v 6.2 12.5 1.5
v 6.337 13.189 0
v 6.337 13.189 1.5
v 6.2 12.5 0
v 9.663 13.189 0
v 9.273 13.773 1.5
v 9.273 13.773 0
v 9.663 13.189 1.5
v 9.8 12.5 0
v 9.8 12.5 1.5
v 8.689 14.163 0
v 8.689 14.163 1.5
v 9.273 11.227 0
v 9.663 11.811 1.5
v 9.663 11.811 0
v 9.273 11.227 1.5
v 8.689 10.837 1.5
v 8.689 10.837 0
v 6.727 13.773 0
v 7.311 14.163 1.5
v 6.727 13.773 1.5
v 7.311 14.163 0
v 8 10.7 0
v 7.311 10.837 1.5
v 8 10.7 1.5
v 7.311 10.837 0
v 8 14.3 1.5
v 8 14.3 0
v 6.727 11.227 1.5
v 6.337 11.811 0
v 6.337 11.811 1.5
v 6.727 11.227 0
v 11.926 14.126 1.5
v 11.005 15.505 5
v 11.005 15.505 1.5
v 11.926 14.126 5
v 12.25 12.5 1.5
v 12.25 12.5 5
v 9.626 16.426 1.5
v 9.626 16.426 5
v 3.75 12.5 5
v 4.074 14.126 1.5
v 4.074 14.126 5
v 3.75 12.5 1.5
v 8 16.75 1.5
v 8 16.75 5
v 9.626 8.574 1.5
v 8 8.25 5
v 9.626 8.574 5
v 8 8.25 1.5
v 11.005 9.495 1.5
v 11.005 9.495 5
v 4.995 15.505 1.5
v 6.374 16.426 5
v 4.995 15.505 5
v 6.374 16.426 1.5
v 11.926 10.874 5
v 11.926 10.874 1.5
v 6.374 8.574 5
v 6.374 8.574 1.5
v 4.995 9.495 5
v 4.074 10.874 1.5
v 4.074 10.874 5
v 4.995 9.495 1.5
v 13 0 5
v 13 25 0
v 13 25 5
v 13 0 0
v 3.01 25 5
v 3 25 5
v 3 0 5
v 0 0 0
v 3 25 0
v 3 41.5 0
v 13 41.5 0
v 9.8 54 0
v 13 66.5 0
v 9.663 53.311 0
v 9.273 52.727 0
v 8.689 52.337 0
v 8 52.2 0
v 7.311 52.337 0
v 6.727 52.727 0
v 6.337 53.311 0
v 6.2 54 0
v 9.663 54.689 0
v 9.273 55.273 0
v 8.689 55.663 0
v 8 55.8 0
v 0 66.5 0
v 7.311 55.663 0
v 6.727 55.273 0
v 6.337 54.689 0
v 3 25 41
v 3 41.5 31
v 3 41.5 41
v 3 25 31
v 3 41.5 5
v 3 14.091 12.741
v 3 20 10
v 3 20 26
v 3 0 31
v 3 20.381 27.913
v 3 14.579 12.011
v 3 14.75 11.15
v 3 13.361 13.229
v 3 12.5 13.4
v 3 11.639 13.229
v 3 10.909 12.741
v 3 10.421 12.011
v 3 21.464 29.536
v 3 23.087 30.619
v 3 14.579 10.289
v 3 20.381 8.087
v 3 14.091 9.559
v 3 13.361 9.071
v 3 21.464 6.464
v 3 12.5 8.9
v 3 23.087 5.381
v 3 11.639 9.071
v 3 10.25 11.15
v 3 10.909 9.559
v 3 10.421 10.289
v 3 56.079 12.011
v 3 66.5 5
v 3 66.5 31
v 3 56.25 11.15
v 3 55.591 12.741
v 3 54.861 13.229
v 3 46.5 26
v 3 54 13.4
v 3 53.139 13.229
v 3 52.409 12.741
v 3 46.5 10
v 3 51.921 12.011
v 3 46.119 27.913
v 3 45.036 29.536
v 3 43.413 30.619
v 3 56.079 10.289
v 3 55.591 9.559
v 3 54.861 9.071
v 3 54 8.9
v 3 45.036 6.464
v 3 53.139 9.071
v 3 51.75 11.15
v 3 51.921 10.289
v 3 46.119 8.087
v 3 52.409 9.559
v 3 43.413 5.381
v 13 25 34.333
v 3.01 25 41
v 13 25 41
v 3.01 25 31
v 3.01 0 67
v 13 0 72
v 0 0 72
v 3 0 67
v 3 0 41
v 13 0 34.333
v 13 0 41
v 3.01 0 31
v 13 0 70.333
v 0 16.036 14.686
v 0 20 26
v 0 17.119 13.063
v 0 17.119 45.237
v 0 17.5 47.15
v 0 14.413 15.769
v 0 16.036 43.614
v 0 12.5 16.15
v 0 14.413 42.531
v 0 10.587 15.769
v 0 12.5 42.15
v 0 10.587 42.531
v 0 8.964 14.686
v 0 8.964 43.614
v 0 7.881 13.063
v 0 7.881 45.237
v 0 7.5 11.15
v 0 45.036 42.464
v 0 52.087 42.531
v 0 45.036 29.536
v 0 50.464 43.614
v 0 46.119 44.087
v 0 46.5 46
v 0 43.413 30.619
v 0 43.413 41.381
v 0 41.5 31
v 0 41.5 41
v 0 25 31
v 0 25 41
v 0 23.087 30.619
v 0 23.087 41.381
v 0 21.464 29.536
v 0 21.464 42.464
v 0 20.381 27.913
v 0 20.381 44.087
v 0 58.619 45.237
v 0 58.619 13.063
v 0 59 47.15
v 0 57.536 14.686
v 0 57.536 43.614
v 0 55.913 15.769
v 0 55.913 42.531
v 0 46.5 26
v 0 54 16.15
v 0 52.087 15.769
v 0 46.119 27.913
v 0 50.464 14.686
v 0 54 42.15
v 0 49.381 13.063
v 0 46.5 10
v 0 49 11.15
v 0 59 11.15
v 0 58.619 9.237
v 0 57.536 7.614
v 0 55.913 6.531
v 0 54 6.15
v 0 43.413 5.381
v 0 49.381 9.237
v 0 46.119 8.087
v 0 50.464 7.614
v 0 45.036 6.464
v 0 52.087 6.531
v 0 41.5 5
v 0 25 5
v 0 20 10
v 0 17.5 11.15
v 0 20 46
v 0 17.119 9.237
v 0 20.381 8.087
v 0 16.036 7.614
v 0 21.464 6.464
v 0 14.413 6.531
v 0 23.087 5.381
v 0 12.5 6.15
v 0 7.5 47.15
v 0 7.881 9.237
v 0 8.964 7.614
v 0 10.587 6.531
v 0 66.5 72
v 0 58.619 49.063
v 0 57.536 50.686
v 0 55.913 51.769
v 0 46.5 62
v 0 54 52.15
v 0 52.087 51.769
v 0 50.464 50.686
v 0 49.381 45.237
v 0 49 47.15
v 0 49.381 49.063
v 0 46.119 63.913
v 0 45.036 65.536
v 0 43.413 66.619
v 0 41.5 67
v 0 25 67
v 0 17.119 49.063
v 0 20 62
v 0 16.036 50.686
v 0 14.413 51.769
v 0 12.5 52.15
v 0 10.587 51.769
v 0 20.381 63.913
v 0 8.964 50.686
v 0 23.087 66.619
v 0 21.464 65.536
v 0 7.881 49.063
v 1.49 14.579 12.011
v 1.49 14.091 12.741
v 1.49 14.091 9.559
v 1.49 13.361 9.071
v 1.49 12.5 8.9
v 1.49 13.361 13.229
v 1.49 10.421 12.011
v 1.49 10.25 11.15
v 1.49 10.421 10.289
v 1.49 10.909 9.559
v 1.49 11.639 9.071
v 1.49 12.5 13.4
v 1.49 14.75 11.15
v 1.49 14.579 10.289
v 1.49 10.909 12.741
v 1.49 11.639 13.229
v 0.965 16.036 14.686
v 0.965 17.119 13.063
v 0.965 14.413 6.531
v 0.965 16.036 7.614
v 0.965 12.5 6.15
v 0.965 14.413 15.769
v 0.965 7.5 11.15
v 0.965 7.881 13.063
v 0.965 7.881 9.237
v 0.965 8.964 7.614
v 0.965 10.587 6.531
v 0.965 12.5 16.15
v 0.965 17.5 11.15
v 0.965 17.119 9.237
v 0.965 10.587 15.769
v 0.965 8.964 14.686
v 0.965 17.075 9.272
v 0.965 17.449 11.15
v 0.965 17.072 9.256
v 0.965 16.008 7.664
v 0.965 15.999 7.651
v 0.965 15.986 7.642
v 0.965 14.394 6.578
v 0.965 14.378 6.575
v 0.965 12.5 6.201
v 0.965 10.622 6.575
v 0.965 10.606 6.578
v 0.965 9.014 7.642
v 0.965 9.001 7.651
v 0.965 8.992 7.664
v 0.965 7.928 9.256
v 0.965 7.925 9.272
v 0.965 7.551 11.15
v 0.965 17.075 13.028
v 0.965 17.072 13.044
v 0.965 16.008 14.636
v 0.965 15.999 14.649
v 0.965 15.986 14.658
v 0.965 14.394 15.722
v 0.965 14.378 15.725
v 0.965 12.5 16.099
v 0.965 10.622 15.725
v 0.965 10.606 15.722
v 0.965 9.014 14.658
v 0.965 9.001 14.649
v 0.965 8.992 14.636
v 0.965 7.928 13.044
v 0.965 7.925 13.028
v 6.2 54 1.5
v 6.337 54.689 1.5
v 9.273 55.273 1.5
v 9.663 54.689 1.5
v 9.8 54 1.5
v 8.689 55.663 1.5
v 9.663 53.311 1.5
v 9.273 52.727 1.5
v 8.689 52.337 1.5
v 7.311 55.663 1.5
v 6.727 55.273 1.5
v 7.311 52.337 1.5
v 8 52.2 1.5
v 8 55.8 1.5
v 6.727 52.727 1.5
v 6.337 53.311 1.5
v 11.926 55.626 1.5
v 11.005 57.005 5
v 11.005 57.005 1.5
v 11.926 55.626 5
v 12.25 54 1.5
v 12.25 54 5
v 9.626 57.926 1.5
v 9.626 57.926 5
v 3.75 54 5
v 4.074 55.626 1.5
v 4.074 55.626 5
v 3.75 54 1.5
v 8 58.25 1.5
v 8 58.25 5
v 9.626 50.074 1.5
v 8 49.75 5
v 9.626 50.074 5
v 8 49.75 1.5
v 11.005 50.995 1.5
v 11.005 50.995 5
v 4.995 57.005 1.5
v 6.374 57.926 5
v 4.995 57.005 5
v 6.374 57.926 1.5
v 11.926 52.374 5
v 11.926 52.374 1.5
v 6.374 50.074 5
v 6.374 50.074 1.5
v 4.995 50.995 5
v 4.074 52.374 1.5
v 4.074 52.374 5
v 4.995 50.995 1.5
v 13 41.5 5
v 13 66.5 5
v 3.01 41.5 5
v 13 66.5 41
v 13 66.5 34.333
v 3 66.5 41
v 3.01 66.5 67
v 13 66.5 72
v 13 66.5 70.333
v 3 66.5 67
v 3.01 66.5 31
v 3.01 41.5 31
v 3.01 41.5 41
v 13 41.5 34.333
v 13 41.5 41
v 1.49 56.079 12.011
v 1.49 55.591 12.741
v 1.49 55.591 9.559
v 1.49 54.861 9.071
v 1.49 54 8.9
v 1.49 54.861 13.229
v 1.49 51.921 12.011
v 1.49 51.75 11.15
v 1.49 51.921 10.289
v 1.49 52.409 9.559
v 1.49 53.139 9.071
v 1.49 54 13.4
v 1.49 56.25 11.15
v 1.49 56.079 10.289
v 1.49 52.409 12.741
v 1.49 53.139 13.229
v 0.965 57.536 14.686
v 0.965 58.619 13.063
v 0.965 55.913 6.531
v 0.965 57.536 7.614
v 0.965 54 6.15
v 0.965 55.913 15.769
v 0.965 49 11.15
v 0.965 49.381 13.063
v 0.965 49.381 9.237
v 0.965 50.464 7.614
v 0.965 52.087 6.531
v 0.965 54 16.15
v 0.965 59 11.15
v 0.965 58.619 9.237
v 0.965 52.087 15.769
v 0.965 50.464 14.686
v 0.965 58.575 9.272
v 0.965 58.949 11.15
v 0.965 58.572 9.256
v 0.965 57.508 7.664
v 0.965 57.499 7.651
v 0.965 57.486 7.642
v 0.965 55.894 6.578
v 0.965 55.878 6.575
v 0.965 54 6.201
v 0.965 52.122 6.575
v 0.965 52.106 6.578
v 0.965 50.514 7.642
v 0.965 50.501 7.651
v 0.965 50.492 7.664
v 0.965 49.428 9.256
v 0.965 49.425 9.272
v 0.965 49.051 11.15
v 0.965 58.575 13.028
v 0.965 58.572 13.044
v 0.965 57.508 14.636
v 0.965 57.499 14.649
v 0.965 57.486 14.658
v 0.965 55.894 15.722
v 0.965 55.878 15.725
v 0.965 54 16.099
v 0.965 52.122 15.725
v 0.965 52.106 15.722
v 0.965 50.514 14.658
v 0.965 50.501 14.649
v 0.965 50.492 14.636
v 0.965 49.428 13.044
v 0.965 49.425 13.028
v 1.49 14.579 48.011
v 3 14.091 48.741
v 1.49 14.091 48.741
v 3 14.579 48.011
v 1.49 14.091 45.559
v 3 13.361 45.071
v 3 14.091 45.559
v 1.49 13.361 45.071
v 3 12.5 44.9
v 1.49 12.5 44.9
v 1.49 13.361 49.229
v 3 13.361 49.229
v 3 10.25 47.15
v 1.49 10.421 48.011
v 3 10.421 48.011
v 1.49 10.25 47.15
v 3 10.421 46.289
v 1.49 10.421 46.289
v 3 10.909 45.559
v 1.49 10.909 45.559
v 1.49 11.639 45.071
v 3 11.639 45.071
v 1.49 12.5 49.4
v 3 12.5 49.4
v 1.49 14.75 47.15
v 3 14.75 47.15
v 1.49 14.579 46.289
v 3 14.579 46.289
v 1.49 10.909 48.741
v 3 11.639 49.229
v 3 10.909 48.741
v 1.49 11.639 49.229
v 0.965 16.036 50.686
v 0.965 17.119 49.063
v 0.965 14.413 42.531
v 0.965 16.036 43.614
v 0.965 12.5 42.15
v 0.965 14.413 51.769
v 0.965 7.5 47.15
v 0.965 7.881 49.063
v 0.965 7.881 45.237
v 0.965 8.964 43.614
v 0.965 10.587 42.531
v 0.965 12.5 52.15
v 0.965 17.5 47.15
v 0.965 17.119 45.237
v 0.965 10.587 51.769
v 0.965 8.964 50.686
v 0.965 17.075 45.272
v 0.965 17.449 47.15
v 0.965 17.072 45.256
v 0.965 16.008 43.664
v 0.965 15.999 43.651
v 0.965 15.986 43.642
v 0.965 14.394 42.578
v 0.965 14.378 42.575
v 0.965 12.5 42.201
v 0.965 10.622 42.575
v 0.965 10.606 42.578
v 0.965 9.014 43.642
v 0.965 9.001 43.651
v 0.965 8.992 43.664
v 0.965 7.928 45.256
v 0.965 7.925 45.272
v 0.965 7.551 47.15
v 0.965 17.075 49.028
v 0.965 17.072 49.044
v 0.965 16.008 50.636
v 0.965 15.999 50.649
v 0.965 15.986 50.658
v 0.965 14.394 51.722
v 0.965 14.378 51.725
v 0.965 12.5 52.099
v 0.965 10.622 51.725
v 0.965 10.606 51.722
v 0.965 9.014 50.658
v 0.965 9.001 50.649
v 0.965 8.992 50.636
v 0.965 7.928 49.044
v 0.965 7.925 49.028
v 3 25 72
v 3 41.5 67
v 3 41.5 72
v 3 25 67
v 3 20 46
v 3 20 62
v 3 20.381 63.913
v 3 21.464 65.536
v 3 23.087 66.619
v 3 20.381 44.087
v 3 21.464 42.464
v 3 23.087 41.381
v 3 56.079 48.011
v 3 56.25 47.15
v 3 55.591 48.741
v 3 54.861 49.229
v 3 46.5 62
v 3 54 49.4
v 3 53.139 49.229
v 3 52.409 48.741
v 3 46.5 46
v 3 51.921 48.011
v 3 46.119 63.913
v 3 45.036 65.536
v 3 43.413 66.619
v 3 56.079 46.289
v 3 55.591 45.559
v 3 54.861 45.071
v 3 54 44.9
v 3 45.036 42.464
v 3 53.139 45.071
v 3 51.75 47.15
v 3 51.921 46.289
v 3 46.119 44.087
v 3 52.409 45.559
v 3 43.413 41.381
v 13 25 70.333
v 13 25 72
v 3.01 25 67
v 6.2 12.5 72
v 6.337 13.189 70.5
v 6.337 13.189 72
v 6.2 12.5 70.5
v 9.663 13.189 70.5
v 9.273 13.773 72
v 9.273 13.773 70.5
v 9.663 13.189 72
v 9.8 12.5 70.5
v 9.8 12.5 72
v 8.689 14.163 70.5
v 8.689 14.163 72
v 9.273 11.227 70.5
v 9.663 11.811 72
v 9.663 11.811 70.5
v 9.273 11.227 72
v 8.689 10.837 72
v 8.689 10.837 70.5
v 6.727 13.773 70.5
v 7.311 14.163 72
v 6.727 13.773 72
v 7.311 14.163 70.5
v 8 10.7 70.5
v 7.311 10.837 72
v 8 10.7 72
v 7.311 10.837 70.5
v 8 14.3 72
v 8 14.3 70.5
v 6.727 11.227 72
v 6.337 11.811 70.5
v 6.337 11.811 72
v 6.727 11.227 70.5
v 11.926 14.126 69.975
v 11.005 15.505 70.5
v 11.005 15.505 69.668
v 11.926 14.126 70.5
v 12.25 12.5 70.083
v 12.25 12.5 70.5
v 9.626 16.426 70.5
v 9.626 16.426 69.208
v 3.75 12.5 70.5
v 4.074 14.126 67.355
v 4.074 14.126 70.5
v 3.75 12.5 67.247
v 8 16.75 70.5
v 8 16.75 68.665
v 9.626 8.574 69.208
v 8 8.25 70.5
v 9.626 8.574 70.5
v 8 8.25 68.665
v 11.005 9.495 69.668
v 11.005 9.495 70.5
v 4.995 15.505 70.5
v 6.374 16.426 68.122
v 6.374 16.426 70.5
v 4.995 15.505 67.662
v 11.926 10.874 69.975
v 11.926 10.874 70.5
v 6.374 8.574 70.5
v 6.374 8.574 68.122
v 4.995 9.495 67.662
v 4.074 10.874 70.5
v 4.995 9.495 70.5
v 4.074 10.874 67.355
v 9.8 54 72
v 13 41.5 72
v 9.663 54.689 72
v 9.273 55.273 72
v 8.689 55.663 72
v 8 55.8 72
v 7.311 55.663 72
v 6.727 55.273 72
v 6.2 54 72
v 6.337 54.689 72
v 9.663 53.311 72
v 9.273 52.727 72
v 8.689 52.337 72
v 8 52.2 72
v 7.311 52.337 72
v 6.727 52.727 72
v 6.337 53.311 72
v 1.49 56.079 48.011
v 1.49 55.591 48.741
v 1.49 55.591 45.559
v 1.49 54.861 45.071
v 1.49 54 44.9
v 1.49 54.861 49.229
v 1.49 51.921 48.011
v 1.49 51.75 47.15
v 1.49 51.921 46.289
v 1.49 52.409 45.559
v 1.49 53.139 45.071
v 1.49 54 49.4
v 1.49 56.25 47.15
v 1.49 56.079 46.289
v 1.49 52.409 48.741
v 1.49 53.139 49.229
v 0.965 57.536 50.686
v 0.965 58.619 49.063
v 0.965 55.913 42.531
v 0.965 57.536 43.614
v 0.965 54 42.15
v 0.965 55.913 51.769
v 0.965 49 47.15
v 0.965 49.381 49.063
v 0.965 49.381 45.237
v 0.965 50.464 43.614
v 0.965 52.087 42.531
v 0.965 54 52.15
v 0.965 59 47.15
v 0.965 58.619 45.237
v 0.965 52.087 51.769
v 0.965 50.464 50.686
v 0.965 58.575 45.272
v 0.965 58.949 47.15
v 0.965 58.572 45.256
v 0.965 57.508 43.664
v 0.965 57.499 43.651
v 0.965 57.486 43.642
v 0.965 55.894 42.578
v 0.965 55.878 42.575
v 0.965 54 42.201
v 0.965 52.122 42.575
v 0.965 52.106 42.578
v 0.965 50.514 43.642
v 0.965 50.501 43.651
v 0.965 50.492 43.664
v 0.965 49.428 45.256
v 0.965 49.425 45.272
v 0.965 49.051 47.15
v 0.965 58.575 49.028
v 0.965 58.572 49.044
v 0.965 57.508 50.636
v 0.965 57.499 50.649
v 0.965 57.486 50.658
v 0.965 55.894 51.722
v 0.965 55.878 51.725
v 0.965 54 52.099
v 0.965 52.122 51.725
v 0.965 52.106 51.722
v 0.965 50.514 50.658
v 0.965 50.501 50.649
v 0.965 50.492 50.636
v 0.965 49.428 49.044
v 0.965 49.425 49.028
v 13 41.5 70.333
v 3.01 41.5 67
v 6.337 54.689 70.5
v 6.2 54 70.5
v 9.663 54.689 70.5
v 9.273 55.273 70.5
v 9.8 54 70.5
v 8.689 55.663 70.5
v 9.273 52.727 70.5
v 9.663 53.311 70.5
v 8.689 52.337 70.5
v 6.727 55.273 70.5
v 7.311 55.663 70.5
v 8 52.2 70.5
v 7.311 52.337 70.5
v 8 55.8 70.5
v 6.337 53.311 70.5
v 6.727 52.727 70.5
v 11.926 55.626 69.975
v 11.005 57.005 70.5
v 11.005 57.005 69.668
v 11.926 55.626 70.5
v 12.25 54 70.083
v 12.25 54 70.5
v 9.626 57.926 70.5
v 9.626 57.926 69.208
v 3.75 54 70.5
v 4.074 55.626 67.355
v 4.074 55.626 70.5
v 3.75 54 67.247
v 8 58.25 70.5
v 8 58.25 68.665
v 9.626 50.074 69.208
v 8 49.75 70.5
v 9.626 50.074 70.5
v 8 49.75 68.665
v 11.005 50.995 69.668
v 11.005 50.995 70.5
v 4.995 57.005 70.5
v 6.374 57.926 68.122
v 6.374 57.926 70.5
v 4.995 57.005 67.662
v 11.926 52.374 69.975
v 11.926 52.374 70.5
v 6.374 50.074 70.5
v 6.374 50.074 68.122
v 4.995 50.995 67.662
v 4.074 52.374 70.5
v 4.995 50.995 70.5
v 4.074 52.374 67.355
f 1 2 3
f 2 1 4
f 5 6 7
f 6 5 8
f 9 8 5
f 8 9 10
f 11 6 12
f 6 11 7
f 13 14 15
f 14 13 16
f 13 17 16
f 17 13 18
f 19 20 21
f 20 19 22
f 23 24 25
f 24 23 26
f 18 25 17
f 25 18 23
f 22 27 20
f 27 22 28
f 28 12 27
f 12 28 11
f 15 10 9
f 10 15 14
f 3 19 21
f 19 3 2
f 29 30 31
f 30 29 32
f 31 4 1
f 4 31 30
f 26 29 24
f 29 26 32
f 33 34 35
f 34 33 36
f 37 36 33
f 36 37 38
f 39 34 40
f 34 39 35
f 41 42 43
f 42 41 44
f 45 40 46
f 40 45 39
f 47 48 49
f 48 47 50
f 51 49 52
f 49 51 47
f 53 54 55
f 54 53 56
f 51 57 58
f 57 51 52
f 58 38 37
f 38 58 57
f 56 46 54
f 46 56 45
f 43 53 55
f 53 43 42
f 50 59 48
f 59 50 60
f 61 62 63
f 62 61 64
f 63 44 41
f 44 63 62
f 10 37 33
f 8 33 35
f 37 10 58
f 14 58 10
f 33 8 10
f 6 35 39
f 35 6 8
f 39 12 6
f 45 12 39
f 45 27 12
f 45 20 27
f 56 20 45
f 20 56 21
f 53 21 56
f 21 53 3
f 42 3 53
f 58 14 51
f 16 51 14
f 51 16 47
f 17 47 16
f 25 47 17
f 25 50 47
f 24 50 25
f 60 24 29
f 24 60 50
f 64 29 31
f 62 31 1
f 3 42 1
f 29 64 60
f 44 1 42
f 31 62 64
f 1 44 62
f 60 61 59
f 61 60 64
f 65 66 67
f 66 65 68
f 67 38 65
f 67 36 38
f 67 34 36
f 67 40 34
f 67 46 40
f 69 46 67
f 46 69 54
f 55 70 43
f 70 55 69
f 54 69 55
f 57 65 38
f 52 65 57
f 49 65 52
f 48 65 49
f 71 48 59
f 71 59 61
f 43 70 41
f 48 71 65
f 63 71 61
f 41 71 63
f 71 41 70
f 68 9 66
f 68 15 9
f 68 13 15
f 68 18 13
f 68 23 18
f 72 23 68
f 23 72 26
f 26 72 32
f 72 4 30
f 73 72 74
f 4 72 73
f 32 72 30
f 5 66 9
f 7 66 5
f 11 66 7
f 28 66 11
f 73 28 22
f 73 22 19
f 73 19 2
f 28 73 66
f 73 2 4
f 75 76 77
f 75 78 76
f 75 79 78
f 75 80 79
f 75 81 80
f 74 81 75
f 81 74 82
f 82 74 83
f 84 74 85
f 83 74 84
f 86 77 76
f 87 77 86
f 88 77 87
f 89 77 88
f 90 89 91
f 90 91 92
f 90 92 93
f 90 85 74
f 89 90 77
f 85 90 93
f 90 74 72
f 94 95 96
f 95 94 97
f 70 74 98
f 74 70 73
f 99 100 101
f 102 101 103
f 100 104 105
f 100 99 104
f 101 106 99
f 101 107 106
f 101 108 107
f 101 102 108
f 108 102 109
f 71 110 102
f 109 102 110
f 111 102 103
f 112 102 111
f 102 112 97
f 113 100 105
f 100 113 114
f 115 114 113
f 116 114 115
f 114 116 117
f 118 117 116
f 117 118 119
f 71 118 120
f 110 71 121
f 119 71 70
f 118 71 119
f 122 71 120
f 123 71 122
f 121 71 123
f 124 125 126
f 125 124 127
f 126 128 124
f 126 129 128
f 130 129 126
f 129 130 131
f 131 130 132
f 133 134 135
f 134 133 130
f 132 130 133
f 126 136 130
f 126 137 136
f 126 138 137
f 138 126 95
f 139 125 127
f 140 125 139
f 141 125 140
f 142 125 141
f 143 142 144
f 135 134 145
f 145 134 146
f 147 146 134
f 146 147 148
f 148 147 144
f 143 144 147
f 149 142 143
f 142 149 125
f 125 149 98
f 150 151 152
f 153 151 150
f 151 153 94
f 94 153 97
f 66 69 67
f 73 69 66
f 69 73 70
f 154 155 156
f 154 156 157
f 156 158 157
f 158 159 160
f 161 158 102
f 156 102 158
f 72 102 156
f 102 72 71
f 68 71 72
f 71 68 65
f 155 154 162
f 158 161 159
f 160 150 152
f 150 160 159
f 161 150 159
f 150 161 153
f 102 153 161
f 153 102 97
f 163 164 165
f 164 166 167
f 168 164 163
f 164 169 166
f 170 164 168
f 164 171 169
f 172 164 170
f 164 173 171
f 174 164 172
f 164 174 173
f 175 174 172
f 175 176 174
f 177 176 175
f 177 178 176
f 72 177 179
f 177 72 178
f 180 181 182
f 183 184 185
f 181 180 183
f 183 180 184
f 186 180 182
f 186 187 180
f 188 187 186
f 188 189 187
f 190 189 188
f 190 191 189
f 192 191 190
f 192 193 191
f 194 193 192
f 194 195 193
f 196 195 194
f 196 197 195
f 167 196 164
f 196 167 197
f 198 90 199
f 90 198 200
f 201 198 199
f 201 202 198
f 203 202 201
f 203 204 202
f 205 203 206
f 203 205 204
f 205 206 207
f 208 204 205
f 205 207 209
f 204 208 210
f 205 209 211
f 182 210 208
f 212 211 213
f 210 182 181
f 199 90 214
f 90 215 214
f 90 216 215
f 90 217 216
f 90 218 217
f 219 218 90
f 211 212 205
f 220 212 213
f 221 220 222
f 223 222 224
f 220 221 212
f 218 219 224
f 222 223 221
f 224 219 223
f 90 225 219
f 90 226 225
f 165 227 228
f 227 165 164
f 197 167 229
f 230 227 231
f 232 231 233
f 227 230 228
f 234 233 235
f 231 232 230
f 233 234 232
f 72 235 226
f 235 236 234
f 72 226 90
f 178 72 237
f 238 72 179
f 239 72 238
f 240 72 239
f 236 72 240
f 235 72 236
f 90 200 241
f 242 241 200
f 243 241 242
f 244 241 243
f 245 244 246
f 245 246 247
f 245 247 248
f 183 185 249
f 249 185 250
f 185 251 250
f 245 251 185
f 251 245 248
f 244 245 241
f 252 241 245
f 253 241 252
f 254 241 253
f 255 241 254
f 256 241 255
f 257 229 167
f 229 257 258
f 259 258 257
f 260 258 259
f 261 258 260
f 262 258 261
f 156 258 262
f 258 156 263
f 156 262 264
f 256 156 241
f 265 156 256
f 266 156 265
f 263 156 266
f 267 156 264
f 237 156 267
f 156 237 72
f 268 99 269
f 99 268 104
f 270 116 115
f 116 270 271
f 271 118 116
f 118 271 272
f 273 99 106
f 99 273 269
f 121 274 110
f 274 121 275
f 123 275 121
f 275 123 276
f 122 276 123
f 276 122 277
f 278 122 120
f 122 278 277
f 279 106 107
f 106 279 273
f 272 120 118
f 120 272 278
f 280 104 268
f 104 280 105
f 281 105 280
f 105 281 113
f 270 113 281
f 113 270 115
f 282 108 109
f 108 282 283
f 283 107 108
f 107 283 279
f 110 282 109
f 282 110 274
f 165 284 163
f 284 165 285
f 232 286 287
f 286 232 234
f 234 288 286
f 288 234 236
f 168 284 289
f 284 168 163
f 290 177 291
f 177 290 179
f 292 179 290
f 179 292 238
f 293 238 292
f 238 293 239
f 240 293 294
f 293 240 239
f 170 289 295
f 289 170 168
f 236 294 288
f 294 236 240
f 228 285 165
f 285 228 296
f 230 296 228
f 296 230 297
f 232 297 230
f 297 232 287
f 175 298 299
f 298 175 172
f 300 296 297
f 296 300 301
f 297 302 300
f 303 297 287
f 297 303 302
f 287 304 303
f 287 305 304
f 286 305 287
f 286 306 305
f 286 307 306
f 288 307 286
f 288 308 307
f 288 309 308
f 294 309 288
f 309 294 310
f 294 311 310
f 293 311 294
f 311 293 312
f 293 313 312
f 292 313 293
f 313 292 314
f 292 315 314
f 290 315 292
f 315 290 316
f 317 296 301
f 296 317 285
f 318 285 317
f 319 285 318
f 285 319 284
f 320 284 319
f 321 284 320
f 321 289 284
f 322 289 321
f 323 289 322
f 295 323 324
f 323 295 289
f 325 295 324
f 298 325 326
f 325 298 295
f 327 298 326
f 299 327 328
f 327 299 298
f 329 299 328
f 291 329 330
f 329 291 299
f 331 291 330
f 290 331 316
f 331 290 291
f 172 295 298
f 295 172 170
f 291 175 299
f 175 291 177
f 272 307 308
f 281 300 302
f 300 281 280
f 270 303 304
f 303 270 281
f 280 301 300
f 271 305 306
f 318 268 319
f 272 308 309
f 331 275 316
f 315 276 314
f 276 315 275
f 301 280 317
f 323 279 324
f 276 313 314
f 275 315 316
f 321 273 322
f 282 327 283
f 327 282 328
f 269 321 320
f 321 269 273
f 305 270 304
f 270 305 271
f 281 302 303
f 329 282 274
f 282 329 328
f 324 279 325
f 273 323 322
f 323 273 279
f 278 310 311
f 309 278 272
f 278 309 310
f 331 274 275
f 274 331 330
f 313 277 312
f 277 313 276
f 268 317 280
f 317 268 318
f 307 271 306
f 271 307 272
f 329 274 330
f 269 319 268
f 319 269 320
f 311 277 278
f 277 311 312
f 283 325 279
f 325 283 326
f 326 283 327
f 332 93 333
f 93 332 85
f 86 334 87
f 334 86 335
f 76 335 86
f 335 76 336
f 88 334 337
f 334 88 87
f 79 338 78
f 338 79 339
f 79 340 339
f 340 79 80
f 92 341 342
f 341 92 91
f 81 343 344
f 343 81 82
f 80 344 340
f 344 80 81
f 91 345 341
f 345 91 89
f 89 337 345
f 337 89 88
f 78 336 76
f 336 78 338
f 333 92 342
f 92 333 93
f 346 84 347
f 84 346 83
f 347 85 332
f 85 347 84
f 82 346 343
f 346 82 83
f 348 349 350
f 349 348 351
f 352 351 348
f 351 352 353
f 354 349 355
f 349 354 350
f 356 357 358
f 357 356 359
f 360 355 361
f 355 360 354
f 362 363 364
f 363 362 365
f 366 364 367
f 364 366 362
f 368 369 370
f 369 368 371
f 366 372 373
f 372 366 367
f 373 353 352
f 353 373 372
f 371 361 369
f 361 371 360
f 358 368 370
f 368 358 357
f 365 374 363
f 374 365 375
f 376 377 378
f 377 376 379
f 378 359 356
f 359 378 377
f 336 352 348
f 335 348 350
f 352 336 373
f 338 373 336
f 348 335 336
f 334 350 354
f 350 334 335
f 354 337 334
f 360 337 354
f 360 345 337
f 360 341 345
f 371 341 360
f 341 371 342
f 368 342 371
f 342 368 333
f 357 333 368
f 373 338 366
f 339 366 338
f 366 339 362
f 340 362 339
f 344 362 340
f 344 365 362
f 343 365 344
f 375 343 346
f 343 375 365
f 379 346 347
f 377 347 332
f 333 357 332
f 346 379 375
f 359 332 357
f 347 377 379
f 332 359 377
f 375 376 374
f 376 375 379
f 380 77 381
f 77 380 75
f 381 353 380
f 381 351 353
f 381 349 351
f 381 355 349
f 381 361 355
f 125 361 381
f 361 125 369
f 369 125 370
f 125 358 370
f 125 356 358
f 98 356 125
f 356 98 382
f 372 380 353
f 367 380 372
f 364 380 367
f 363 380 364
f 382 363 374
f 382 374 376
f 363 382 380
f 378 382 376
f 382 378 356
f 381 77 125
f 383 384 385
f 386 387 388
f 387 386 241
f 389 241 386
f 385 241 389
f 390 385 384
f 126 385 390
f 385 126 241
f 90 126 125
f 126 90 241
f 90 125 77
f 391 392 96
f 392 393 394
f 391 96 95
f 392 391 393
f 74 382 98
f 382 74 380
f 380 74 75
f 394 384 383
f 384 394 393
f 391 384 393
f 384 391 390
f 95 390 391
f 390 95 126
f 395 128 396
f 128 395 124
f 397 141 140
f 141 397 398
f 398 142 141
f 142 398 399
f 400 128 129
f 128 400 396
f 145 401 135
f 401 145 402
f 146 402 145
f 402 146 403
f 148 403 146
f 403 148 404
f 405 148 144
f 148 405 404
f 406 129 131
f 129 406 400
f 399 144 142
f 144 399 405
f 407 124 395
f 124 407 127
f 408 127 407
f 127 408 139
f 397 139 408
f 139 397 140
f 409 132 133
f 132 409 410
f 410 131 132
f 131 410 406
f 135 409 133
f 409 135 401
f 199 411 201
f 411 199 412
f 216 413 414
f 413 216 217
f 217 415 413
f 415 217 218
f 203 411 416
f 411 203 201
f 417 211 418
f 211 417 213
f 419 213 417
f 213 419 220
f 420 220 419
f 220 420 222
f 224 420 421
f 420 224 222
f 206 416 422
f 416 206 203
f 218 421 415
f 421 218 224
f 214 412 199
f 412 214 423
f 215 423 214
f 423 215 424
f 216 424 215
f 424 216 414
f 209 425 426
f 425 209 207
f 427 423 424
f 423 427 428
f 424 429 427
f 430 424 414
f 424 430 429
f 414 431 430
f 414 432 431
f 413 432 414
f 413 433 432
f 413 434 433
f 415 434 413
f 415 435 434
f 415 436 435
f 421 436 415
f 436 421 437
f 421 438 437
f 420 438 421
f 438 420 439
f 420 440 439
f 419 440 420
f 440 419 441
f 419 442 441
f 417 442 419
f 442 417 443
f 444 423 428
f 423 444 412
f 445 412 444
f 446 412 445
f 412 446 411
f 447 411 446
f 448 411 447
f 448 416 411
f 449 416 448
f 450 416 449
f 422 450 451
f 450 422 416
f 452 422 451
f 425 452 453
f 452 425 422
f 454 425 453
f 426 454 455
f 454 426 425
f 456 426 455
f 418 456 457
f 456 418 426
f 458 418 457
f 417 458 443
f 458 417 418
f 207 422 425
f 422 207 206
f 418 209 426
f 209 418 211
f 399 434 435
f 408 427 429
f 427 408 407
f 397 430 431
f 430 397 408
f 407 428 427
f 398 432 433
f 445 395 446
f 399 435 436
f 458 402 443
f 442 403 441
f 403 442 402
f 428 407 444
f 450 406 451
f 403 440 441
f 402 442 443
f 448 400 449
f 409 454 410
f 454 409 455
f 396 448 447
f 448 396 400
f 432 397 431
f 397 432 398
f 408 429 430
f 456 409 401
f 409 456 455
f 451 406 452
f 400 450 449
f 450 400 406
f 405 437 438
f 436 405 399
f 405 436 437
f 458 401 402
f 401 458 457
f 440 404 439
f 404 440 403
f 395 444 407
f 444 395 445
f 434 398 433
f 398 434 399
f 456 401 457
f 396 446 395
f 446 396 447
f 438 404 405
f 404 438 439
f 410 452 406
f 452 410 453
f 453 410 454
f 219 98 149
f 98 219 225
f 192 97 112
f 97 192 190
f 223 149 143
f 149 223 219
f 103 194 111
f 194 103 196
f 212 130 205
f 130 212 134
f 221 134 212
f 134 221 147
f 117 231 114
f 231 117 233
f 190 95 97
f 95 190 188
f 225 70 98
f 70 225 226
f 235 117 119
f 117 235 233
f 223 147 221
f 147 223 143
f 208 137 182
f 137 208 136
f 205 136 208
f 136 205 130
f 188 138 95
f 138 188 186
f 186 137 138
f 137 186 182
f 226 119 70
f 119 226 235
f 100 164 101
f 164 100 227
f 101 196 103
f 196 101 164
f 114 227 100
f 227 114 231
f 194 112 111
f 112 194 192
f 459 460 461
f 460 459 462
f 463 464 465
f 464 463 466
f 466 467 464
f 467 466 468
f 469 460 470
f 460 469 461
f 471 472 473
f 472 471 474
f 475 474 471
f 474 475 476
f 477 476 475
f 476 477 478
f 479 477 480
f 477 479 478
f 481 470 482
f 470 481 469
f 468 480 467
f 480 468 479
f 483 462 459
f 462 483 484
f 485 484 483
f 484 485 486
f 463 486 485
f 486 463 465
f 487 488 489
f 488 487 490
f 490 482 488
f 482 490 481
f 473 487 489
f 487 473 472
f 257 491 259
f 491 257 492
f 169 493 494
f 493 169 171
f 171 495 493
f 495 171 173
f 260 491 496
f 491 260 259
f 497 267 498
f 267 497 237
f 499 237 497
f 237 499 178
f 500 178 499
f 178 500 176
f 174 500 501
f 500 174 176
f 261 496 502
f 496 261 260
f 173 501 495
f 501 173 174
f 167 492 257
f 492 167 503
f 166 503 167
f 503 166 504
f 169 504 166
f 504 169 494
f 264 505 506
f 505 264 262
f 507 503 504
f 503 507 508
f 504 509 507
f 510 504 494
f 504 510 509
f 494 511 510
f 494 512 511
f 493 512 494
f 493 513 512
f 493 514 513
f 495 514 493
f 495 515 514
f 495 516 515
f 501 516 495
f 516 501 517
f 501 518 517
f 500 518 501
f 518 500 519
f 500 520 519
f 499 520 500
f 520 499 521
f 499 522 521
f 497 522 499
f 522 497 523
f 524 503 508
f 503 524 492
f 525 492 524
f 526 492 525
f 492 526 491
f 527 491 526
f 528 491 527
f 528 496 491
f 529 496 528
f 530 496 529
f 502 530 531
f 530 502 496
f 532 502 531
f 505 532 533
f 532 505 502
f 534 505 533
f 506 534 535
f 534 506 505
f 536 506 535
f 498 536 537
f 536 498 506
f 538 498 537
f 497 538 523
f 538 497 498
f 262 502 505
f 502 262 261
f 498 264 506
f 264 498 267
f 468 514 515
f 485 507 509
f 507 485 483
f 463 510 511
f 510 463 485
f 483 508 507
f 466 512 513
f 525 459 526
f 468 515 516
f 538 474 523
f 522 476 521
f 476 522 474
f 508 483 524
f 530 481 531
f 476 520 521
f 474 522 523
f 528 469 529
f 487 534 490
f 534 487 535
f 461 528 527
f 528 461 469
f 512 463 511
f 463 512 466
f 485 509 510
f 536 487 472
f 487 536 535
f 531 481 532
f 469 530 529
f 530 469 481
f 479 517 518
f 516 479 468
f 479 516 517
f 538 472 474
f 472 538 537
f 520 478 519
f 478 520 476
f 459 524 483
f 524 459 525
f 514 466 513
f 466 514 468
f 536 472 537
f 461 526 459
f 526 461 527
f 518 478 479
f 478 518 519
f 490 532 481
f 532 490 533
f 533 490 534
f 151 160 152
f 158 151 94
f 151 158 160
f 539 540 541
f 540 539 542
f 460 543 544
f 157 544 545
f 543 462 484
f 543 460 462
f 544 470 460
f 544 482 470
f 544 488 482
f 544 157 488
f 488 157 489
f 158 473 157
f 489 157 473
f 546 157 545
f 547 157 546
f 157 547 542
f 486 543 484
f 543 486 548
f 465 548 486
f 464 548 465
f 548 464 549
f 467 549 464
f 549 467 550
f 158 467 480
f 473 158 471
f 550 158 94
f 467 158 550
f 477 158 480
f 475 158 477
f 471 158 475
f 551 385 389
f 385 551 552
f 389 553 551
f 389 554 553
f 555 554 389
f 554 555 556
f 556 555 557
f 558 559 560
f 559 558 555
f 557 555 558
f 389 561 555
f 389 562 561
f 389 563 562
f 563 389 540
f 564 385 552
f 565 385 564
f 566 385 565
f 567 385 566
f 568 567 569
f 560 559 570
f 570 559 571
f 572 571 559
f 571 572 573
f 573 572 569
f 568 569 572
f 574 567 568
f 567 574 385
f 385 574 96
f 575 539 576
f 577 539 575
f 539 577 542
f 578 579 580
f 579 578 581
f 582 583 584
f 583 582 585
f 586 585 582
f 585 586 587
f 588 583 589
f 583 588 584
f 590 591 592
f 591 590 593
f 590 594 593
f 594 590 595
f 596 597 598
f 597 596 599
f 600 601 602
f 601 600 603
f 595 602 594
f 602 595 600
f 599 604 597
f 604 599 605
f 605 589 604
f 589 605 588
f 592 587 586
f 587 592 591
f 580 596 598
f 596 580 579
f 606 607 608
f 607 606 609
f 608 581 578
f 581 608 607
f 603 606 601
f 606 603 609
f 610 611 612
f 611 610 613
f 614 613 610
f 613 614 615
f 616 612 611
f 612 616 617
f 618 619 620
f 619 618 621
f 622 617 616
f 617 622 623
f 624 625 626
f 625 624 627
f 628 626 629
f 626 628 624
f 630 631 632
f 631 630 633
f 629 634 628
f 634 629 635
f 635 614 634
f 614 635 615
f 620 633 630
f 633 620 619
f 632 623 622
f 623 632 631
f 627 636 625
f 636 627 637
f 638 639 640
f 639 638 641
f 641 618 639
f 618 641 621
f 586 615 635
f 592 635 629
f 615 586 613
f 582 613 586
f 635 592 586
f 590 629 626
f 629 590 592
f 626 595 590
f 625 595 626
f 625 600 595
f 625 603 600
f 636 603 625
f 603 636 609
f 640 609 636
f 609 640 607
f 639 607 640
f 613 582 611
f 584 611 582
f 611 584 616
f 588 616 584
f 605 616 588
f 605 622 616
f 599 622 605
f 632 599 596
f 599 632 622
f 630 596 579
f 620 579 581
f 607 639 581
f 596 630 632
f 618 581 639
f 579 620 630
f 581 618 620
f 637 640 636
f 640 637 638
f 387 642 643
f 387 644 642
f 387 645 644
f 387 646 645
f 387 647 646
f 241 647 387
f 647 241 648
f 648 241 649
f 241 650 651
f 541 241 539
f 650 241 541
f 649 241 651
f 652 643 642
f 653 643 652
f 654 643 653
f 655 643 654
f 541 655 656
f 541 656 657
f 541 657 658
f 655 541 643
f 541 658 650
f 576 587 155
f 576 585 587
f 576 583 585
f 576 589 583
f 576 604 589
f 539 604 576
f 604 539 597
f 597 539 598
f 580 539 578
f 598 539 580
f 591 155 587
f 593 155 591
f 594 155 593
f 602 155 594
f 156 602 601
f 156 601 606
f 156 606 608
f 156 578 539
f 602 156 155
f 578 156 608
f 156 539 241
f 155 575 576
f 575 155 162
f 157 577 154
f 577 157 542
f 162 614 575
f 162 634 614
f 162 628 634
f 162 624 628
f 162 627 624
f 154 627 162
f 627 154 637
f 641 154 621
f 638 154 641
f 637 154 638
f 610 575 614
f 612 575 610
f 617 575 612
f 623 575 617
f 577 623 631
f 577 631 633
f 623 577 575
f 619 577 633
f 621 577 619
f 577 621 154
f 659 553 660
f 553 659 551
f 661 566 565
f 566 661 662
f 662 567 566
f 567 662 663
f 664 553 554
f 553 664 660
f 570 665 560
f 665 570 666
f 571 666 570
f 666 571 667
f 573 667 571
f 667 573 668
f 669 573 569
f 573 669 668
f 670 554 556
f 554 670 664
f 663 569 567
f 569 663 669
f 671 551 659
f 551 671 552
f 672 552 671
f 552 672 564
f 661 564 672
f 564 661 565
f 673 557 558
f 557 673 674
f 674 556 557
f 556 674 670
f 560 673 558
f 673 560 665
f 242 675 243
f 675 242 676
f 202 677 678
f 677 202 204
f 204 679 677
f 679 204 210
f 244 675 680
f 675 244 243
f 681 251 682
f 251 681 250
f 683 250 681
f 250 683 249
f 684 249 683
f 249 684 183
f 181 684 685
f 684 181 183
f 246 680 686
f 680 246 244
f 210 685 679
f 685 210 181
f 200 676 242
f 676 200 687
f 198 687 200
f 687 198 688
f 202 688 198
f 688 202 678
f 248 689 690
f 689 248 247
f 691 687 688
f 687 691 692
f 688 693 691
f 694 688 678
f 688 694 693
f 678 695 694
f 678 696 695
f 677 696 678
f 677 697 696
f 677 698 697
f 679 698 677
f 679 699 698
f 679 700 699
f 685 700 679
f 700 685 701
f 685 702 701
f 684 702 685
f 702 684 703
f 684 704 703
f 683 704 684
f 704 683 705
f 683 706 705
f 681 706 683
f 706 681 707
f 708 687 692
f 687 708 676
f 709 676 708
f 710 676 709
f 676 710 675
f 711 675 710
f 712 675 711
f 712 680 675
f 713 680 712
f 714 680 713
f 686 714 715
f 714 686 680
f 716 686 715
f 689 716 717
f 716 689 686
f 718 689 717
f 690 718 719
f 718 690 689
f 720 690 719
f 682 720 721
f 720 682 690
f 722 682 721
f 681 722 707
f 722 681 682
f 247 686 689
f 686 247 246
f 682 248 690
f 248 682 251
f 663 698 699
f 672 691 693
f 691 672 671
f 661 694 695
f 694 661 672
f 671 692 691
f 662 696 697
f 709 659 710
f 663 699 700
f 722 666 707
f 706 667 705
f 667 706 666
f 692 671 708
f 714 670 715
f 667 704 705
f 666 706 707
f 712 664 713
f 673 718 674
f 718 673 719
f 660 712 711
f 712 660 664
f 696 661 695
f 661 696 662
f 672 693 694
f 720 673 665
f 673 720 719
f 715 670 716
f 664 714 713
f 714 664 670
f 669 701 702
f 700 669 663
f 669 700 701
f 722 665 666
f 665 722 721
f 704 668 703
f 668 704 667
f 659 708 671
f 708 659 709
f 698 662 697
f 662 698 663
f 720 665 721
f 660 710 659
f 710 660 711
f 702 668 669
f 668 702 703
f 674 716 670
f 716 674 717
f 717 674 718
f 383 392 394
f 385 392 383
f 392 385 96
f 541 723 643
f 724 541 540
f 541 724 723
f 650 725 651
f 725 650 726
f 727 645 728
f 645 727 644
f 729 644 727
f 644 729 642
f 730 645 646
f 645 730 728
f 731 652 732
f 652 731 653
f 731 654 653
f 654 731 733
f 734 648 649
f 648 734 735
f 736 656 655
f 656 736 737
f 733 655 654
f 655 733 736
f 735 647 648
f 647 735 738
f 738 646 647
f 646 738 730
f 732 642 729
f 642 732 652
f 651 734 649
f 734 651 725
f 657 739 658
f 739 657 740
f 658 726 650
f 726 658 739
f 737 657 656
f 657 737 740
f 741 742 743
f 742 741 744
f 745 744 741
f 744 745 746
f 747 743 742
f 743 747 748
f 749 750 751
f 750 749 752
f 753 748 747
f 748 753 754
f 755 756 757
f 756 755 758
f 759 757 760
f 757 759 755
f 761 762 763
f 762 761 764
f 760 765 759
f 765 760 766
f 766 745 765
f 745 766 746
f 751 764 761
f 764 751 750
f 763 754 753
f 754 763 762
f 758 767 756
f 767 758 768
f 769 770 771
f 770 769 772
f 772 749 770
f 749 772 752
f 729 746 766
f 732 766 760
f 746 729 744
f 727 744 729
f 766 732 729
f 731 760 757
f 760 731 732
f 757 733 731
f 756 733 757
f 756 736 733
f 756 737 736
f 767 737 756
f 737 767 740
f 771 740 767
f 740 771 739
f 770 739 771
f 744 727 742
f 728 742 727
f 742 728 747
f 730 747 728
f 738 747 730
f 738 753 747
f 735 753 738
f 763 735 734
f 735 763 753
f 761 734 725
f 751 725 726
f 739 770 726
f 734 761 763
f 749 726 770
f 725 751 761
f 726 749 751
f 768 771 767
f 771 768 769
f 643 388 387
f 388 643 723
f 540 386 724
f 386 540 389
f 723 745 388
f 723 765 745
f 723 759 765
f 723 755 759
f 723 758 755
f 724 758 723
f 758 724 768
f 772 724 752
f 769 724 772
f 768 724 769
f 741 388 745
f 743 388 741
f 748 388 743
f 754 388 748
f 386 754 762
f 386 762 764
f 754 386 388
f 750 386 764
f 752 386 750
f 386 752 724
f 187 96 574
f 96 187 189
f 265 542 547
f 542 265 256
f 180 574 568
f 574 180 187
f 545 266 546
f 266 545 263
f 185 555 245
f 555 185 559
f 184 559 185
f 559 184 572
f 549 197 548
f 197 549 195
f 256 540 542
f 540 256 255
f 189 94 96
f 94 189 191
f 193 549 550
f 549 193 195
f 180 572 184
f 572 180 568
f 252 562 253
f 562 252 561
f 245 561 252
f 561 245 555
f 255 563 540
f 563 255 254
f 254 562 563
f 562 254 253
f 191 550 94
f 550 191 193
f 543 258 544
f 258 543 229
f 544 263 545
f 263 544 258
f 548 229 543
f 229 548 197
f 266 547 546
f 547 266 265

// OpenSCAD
/*

3.5in Drive Stacker - v1.0 - (C) 2022 Matthew Nielsen
https://github.com/xunker/random_scad/3_5_drive_stacker

Commercial use/reproduction of code or resulting rendered output is strictly forbidden without
written consent of author. All other use/reproduction/modification shall be under these same terms
and must include this notice and must include original author information.

*/


// Rotation is to put flat side down for printing
rotate([0, -90, 0]) {
  // single();
  // stack_of_two();
  // stack_of_three();
}

double_wide(stack=2, column_spacing = screw_x_offsets[1] - screw_x_offsets[0]);
// translate([0, 70, 0])
//   double_wide(stack=2, column_spacing = screw_x_offsets[2] - screw_x_offsets[1]);
// translate([0, 160, 0]) double_wide(column_spacing = screw_x_offsets[2] - screw_x_offsets[0]);


/* SETTINGS AND CODE BELOW */
drive_total_h = 26;

// Screw hole offsets measurements are fron the rear (connector) end
screw_x_offsets = [
  28.5, // +- 0.25
  70.0,
  130.1 // +- 0.5
];

screw_z_offset = 6.35-0.2; // +- 0.25

column_t = 5-2;
column_w = 25;

shelf_w = 10;
shelf_l = column_w;
shelf_t = 5;

drive_addt_h = 0;

drive_screw_hole_d = 4.5;
drive_screw_countersink_d = 10;
drive_screw_countersink_h = column_t - 1.5;

attachment_screw_hole_d = 3.6;
attachment_screw_countersink_d = 8.5;
attachment_screw_countersink_h = 3.5;

total_unit_h = drive_total_h + drive_addt_h + (shelf_t*2);

double_wide_cutout_corner_r=5;

//---


ff = 0.01;

module raw_column() {
  cube([column_t, column_w, drive_total_h + (shelf_t * 2) + drive_addt_h]);
}

module drive_shelf(attachment_screw_holes=true) {
  difference() {
    cube([shelf_w, shelf_l, shelf_t]);
    union() {
      if (attachment_screw_holes) translate([shelf_w/2, shelf_l/2, -ff]) {
        $fn=16;
        cylinder(d=attachment_screw_hole_d, h=shelf_t+(ff*2));
        translate([0, 0, shelf_t-attachment_screw_countersink_h+ff]) cylinder(d=attachment_screw_countersink_d, h=attachment_screw_countersink_h+(ff));
      }
    }
  }
}

module attachment_shelf(attachment_screw_holes=true) {
  difference() {
    hull() {
      cube([ff, shelf_l, shelf_t]);
      translate([shelf_w - ff, 0, shelf_t-(shelf_t/3)]) cube([ff, shelf_l, shelf_t/3]);
    }

    union() {
      if (attachment_screw_holes) translate([shelf_w/2, shelf_l/2, -ff]) {
        $fn=16;
        cylinder(d=attachment_screw_hole_d, h=shelf_t+(ff*2));
        translate([0, 0, 0]) cylinder(d=attachment_screw_countersink_d, h=attachment_screw_countersink_h+(ff));
      }
    }
  }
}

module complete_column(upper_attachment_screw_holes=true, lower_attachment_screw_holes=true) {
  difference() {
    union() {
      raw_column();
      translate([column_t, 0, 0]) drive_shelf(attachment_screw_holes=lower_attachment_screw_holes);
      translate([column_t, 0, shelf_t + drive_total_h + drive_addt_h]) attachment_shelf(attachment_screw_holes=upper_attachment_screw_holes);
    }

    translate([-ff, column_w/2, shelf_t + (screw_z_offset)]) rotate([0, 90, 0]) {
      $fn=16;
      cylinder(d=drive_screw_hole_d, h=column_t+(ff*2));
      translate([0, 0, -ff]) cylinder(d=drive_screw_countersink_d, h=(drive_screw_countersink_h*0.65)+ff);
      translate([0, 0, (drive_screw_countersink_h*0.65)-ff]) cylinder(d2=drive_screw_hole_d, d1=drive_screw_countersink_d, h=(drive_screw_countersink_h*0.35)+ff);
    }
  }
}

module single() {
  complete_column();
}

//stack of two
module stack_of_two() {
  translate([0, 0, (shelf_t*2)+drive_total_h+drive_addt_h]) complete_column(upper_attachment_screw_holes=true, lower_attachment_screw_holes=false);
  complete_column(upper_attachment_screw_holes=false, lower_attachment_screw_holes=true);
}

//stack of three
module stack_of_three() {
  translate([0, 0, ((shelf_t*2)+drive_total_h+drive_addt_h)*2]) complete_column(upper_attachment_screw_holes=true, lower_attachment_screw_holes=false);
  translate([0, 0, (shelf_t*2)+drive_total_h+drive_addt_h]) complete_column(upper_attachment_screw_holes=false, lower_attachment_screw_holes=false);
  complete_column(upper_attachment_screw_holes=false, lower_attachment_screw_holes=true);
}


module double_wide(column_spacing, stack=1, upper_attachment_screw_holes=true, lower_attachment_screw_holes=true) {
  for (stack_no=[0:stack-1])
    translate([0, 0, total_unit_h*stack_no]) difference() {
      union() {
        for (x_offset = [0, column_spacing])
          translate([0, x_offset, 0])
            complete_column(
              // upper_attachment_screw_holes=upper_attachment_screw_holes,
              upper_attachment_screw_holes=(upper_attachment_screw_holes && stack_no == stack-1),
              // lower_attachment_screw_holes=lower_attachment_screw_holes
              lower_attachment_screw_holes=(lower_attachment_screw_holes && stack_no == 0)
            );
        translate([0, column_w, 0]) cube([column_t, column_spacing-column_w, total_unit_h]);
      }


      hull()
      translate([0, column_w, 0])
      translate([0, (column_spacing-column_w)/2, 0])
        rotate([0, 90, 0]) translate([0, 0, -ff]) {

          translate([-total_unit_h/2, 0, 0])
          for (x_sign=[1,-1])
            for (y_sign=[1,-1])
            translate([((total_unit_h/2)-shelf_t-double_wide_cutout_corner_r)*y_sign, ((column_spacing-(column_w))/2)*x_sign, 0]) cylinder(r=double_wide_cutout_corner_r, h=column_t+(ff*2));
        }
    }
}
